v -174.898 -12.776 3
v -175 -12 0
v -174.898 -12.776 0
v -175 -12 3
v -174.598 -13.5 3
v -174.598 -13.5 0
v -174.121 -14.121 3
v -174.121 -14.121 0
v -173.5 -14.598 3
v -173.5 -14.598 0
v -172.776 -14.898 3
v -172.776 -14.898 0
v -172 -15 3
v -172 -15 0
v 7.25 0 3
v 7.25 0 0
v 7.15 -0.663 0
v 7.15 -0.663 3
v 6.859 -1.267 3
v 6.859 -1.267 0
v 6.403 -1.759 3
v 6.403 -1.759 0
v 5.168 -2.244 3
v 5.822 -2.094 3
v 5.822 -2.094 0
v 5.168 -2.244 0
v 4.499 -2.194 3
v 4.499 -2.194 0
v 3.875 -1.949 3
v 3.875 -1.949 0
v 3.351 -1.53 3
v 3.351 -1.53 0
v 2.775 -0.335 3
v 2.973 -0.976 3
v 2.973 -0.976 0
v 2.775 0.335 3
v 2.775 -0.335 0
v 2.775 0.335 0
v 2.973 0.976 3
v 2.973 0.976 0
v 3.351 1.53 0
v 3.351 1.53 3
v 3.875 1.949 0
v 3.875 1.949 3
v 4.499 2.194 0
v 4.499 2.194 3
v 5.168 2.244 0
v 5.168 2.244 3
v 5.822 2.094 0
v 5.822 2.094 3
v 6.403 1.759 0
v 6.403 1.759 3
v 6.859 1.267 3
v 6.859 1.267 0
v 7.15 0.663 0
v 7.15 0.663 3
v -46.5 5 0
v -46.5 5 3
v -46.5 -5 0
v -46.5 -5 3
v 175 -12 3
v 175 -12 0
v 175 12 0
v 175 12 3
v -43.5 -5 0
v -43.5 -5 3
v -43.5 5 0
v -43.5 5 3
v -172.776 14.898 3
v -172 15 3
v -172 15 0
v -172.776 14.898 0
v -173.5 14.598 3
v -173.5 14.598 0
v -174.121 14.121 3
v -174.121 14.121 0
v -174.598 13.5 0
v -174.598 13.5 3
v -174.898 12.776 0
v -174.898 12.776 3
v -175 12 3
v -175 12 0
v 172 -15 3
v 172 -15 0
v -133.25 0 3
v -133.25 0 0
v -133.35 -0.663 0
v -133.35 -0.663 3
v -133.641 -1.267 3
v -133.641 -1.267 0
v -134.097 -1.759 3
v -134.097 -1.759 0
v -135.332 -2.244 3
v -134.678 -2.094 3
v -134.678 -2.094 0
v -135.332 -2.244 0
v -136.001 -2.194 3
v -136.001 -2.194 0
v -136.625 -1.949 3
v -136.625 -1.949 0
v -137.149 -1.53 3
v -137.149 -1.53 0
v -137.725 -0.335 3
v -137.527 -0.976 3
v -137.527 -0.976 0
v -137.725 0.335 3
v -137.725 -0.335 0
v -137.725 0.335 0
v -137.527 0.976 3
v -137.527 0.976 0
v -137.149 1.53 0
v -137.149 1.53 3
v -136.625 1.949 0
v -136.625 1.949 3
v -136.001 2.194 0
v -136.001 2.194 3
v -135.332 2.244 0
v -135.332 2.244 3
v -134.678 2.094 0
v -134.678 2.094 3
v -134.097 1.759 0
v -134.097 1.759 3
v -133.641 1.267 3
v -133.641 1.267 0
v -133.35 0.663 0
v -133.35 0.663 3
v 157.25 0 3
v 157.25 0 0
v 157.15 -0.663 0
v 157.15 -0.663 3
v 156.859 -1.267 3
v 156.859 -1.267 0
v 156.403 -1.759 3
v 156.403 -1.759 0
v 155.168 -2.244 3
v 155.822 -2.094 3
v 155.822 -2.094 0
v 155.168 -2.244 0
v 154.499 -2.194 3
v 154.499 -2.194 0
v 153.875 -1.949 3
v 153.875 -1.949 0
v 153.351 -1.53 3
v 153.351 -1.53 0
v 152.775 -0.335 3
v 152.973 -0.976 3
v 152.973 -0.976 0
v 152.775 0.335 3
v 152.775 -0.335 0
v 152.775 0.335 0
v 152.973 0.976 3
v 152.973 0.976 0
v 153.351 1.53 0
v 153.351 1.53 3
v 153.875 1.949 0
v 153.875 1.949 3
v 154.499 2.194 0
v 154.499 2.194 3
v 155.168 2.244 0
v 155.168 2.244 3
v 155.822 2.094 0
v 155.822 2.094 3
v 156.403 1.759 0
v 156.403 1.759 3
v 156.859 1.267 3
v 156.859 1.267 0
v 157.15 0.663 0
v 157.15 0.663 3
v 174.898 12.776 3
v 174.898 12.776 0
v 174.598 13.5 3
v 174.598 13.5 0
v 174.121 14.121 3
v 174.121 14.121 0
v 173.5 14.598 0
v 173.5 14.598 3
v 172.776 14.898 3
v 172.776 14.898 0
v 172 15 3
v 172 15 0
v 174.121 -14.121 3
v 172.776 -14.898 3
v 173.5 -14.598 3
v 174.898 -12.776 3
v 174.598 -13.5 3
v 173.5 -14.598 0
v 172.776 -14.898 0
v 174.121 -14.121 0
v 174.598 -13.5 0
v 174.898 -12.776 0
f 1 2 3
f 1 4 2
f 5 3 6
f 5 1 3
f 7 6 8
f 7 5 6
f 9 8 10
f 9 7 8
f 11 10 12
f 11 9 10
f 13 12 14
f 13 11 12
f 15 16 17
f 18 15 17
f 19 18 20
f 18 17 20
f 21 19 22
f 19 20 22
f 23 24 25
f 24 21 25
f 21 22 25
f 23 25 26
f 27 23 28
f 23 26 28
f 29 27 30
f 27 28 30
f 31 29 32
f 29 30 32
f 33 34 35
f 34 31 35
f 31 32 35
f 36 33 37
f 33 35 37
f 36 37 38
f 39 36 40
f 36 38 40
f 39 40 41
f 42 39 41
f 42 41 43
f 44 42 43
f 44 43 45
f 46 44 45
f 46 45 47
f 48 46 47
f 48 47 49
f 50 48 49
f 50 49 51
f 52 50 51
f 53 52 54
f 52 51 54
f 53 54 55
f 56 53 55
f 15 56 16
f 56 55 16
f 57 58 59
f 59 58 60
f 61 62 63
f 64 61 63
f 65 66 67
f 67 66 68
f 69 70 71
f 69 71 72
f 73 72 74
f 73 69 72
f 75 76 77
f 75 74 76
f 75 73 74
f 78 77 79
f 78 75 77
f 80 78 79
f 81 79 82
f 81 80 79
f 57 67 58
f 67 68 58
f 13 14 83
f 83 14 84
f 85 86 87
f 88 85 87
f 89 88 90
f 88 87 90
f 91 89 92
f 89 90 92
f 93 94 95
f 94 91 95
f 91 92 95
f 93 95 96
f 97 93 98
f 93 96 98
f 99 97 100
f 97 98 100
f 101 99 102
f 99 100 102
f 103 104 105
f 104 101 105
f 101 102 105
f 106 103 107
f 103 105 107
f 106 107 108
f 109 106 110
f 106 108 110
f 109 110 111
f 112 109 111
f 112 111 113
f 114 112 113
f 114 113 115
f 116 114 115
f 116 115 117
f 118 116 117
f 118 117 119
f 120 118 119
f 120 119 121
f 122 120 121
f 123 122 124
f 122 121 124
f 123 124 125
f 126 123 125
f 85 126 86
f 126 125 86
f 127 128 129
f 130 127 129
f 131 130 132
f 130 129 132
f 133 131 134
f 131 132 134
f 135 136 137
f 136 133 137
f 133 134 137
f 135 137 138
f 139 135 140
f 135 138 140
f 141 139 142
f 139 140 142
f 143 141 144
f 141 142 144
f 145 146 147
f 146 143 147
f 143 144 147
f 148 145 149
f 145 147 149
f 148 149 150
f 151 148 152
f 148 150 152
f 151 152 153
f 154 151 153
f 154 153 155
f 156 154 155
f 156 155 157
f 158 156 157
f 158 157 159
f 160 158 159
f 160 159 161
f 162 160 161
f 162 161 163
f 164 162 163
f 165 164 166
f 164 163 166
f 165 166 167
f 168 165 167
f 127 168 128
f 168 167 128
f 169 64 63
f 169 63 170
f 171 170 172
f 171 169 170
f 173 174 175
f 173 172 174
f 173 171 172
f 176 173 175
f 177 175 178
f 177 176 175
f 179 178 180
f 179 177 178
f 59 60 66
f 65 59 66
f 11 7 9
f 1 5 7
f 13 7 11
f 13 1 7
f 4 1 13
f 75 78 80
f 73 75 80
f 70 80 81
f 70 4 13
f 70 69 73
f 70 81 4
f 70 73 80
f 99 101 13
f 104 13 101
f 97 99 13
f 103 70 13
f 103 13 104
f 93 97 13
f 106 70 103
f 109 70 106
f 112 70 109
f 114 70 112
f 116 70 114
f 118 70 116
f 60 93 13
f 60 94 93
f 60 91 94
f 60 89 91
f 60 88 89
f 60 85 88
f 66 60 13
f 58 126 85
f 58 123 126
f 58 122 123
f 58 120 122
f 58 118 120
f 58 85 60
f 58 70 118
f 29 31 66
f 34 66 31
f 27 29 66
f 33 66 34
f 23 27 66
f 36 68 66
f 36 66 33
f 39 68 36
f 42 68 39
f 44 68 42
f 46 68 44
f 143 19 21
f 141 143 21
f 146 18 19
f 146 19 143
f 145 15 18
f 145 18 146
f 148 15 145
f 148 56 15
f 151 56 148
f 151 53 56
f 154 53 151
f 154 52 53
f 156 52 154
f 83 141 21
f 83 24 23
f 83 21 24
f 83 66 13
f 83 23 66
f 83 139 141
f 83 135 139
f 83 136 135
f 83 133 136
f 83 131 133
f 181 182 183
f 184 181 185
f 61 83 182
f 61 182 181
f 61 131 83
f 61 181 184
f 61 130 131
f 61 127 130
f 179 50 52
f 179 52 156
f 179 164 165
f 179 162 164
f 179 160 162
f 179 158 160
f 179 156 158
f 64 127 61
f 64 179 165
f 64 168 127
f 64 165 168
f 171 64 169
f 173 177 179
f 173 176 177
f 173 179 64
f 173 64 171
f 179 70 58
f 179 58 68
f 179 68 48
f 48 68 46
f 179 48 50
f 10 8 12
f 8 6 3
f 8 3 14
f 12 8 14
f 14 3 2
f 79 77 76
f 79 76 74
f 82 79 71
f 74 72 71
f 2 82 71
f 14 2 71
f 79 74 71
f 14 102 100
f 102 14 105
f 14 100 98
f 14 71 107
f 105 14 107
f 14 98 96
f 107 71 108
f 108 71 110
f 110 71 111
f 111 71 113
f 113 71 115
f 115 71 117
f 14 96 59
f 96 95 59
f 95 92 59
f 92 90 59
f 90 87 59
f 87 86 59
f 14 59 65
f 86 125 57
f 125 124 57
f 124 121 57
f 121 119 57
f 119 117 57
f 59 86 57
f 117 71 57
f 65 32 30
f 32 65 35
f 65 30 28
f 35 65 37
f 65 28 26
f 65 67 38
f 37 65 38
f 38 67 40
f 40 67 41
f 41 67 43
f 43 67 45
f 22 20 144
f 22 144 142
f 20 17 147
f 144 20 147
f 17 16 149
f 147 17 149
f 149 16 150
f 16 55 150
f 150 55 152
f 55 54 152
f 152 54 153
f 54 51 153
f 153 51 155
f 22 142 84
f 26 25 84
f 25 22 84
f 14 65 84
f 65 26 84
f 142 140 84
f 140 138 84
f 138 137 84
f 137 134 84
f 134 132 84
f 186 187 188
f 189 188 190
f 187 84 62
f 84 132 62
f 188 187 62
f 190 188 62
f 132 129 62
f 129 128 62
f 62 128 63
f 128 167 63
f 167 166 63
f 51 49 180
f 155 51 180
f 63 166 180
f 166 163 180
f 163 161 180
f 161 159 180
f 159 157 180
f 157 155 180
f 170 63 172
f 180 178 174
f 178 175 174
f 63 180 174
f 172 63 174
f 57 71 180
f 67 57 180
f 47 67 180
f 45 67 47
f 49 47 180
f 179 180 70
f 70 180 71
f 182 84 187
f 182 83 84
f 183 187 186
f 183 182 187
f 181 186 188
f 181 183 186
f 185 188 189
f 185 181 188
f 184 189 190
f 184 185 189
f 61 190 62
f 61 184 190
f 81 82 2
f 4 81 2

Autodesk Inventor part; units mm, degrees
ref_plane "YZ Plane" through (0, 0, 0) normal (1, 0, 0) x (0, 1, 0)
ref_plane "XZ Plane" through (0, 0, 0) normal (0, 1, 0) x (-1, 0, 0)
ref_plane "XY Plane" through (0, 0, 0) normal (0, 0, 1) x (1, 0, 0)
sketch "Sketch1" plane through (0, 0, 0) normal (0, 0, 1) x (1, 0, 0)
  line L0 (-175, -15) -> (175, -15)
  line L1 (175, -15) -> (175, 15)
  line L2 (175, 15) -> (-175, 15)
  line L3 (-175, 15) -> (-175, -15)
  line L4 (-175, -15) -> (175, 15) construction
  line L5 (175, -15) -> (-175, 15) construction
  line L6 (-175, 0) -> (175, 0) construction
  circle A0 centre (155, 0) radius 2.25
  circle A1 centre (5, 0) radius 2.25
  circle A2 centre (-135.5, 0) radius 2.25
  point P0 (0, 0)
  dimension "d0" = 350
  dimension "d1" = 30
  dimension "d5" = 20
  dimension "d6" = 150
  dimension "d7" = 310.5
  dimension "d10" = 4.5
  dimension "d11" = 4.5
  dimension "d12" = 4.5
extrude "Extrusion1" add sketch "Sketch1" along normal blind 3
sketch "Sketch2" plane through (0, 0, 3) normal (0, 0, 1) x (1, 0, 0)
  line L0 (-46.5, -5) -> (-43.5, -5)
  line L1 (-43.5, -5) -> (-43.5, 5)
  line L2 (-43.5, 5) -> (-46.5, 5)
  line L3 (-46.5, 5) -> (-46.5, -5)
  line L4 (-46.5, -5) -> (-43.5, 5) construction
  line L5 (-43.5, -5) -> (-46.5, 5) construction
  line L6 (175, -15) -> (175, 15) projected
  point P0 (0, 0)
  point P1 (-45, 0)
  point P2 (-45, 0)
  dimension "d13" = 3
  dimension "d14" = 10
  dimension "d15" = 220
extrude "Extrusion2" cut sketch "Sketch2" against normal through all
fillet "Fillet1" radius 3 4 edges at (-175, 15, 1.5) (-175, -15, 1.5) (175, -15, 1.5) (175, 15, 1.5)
equation "\"d16\" = d15"
properties part number "extension2"
